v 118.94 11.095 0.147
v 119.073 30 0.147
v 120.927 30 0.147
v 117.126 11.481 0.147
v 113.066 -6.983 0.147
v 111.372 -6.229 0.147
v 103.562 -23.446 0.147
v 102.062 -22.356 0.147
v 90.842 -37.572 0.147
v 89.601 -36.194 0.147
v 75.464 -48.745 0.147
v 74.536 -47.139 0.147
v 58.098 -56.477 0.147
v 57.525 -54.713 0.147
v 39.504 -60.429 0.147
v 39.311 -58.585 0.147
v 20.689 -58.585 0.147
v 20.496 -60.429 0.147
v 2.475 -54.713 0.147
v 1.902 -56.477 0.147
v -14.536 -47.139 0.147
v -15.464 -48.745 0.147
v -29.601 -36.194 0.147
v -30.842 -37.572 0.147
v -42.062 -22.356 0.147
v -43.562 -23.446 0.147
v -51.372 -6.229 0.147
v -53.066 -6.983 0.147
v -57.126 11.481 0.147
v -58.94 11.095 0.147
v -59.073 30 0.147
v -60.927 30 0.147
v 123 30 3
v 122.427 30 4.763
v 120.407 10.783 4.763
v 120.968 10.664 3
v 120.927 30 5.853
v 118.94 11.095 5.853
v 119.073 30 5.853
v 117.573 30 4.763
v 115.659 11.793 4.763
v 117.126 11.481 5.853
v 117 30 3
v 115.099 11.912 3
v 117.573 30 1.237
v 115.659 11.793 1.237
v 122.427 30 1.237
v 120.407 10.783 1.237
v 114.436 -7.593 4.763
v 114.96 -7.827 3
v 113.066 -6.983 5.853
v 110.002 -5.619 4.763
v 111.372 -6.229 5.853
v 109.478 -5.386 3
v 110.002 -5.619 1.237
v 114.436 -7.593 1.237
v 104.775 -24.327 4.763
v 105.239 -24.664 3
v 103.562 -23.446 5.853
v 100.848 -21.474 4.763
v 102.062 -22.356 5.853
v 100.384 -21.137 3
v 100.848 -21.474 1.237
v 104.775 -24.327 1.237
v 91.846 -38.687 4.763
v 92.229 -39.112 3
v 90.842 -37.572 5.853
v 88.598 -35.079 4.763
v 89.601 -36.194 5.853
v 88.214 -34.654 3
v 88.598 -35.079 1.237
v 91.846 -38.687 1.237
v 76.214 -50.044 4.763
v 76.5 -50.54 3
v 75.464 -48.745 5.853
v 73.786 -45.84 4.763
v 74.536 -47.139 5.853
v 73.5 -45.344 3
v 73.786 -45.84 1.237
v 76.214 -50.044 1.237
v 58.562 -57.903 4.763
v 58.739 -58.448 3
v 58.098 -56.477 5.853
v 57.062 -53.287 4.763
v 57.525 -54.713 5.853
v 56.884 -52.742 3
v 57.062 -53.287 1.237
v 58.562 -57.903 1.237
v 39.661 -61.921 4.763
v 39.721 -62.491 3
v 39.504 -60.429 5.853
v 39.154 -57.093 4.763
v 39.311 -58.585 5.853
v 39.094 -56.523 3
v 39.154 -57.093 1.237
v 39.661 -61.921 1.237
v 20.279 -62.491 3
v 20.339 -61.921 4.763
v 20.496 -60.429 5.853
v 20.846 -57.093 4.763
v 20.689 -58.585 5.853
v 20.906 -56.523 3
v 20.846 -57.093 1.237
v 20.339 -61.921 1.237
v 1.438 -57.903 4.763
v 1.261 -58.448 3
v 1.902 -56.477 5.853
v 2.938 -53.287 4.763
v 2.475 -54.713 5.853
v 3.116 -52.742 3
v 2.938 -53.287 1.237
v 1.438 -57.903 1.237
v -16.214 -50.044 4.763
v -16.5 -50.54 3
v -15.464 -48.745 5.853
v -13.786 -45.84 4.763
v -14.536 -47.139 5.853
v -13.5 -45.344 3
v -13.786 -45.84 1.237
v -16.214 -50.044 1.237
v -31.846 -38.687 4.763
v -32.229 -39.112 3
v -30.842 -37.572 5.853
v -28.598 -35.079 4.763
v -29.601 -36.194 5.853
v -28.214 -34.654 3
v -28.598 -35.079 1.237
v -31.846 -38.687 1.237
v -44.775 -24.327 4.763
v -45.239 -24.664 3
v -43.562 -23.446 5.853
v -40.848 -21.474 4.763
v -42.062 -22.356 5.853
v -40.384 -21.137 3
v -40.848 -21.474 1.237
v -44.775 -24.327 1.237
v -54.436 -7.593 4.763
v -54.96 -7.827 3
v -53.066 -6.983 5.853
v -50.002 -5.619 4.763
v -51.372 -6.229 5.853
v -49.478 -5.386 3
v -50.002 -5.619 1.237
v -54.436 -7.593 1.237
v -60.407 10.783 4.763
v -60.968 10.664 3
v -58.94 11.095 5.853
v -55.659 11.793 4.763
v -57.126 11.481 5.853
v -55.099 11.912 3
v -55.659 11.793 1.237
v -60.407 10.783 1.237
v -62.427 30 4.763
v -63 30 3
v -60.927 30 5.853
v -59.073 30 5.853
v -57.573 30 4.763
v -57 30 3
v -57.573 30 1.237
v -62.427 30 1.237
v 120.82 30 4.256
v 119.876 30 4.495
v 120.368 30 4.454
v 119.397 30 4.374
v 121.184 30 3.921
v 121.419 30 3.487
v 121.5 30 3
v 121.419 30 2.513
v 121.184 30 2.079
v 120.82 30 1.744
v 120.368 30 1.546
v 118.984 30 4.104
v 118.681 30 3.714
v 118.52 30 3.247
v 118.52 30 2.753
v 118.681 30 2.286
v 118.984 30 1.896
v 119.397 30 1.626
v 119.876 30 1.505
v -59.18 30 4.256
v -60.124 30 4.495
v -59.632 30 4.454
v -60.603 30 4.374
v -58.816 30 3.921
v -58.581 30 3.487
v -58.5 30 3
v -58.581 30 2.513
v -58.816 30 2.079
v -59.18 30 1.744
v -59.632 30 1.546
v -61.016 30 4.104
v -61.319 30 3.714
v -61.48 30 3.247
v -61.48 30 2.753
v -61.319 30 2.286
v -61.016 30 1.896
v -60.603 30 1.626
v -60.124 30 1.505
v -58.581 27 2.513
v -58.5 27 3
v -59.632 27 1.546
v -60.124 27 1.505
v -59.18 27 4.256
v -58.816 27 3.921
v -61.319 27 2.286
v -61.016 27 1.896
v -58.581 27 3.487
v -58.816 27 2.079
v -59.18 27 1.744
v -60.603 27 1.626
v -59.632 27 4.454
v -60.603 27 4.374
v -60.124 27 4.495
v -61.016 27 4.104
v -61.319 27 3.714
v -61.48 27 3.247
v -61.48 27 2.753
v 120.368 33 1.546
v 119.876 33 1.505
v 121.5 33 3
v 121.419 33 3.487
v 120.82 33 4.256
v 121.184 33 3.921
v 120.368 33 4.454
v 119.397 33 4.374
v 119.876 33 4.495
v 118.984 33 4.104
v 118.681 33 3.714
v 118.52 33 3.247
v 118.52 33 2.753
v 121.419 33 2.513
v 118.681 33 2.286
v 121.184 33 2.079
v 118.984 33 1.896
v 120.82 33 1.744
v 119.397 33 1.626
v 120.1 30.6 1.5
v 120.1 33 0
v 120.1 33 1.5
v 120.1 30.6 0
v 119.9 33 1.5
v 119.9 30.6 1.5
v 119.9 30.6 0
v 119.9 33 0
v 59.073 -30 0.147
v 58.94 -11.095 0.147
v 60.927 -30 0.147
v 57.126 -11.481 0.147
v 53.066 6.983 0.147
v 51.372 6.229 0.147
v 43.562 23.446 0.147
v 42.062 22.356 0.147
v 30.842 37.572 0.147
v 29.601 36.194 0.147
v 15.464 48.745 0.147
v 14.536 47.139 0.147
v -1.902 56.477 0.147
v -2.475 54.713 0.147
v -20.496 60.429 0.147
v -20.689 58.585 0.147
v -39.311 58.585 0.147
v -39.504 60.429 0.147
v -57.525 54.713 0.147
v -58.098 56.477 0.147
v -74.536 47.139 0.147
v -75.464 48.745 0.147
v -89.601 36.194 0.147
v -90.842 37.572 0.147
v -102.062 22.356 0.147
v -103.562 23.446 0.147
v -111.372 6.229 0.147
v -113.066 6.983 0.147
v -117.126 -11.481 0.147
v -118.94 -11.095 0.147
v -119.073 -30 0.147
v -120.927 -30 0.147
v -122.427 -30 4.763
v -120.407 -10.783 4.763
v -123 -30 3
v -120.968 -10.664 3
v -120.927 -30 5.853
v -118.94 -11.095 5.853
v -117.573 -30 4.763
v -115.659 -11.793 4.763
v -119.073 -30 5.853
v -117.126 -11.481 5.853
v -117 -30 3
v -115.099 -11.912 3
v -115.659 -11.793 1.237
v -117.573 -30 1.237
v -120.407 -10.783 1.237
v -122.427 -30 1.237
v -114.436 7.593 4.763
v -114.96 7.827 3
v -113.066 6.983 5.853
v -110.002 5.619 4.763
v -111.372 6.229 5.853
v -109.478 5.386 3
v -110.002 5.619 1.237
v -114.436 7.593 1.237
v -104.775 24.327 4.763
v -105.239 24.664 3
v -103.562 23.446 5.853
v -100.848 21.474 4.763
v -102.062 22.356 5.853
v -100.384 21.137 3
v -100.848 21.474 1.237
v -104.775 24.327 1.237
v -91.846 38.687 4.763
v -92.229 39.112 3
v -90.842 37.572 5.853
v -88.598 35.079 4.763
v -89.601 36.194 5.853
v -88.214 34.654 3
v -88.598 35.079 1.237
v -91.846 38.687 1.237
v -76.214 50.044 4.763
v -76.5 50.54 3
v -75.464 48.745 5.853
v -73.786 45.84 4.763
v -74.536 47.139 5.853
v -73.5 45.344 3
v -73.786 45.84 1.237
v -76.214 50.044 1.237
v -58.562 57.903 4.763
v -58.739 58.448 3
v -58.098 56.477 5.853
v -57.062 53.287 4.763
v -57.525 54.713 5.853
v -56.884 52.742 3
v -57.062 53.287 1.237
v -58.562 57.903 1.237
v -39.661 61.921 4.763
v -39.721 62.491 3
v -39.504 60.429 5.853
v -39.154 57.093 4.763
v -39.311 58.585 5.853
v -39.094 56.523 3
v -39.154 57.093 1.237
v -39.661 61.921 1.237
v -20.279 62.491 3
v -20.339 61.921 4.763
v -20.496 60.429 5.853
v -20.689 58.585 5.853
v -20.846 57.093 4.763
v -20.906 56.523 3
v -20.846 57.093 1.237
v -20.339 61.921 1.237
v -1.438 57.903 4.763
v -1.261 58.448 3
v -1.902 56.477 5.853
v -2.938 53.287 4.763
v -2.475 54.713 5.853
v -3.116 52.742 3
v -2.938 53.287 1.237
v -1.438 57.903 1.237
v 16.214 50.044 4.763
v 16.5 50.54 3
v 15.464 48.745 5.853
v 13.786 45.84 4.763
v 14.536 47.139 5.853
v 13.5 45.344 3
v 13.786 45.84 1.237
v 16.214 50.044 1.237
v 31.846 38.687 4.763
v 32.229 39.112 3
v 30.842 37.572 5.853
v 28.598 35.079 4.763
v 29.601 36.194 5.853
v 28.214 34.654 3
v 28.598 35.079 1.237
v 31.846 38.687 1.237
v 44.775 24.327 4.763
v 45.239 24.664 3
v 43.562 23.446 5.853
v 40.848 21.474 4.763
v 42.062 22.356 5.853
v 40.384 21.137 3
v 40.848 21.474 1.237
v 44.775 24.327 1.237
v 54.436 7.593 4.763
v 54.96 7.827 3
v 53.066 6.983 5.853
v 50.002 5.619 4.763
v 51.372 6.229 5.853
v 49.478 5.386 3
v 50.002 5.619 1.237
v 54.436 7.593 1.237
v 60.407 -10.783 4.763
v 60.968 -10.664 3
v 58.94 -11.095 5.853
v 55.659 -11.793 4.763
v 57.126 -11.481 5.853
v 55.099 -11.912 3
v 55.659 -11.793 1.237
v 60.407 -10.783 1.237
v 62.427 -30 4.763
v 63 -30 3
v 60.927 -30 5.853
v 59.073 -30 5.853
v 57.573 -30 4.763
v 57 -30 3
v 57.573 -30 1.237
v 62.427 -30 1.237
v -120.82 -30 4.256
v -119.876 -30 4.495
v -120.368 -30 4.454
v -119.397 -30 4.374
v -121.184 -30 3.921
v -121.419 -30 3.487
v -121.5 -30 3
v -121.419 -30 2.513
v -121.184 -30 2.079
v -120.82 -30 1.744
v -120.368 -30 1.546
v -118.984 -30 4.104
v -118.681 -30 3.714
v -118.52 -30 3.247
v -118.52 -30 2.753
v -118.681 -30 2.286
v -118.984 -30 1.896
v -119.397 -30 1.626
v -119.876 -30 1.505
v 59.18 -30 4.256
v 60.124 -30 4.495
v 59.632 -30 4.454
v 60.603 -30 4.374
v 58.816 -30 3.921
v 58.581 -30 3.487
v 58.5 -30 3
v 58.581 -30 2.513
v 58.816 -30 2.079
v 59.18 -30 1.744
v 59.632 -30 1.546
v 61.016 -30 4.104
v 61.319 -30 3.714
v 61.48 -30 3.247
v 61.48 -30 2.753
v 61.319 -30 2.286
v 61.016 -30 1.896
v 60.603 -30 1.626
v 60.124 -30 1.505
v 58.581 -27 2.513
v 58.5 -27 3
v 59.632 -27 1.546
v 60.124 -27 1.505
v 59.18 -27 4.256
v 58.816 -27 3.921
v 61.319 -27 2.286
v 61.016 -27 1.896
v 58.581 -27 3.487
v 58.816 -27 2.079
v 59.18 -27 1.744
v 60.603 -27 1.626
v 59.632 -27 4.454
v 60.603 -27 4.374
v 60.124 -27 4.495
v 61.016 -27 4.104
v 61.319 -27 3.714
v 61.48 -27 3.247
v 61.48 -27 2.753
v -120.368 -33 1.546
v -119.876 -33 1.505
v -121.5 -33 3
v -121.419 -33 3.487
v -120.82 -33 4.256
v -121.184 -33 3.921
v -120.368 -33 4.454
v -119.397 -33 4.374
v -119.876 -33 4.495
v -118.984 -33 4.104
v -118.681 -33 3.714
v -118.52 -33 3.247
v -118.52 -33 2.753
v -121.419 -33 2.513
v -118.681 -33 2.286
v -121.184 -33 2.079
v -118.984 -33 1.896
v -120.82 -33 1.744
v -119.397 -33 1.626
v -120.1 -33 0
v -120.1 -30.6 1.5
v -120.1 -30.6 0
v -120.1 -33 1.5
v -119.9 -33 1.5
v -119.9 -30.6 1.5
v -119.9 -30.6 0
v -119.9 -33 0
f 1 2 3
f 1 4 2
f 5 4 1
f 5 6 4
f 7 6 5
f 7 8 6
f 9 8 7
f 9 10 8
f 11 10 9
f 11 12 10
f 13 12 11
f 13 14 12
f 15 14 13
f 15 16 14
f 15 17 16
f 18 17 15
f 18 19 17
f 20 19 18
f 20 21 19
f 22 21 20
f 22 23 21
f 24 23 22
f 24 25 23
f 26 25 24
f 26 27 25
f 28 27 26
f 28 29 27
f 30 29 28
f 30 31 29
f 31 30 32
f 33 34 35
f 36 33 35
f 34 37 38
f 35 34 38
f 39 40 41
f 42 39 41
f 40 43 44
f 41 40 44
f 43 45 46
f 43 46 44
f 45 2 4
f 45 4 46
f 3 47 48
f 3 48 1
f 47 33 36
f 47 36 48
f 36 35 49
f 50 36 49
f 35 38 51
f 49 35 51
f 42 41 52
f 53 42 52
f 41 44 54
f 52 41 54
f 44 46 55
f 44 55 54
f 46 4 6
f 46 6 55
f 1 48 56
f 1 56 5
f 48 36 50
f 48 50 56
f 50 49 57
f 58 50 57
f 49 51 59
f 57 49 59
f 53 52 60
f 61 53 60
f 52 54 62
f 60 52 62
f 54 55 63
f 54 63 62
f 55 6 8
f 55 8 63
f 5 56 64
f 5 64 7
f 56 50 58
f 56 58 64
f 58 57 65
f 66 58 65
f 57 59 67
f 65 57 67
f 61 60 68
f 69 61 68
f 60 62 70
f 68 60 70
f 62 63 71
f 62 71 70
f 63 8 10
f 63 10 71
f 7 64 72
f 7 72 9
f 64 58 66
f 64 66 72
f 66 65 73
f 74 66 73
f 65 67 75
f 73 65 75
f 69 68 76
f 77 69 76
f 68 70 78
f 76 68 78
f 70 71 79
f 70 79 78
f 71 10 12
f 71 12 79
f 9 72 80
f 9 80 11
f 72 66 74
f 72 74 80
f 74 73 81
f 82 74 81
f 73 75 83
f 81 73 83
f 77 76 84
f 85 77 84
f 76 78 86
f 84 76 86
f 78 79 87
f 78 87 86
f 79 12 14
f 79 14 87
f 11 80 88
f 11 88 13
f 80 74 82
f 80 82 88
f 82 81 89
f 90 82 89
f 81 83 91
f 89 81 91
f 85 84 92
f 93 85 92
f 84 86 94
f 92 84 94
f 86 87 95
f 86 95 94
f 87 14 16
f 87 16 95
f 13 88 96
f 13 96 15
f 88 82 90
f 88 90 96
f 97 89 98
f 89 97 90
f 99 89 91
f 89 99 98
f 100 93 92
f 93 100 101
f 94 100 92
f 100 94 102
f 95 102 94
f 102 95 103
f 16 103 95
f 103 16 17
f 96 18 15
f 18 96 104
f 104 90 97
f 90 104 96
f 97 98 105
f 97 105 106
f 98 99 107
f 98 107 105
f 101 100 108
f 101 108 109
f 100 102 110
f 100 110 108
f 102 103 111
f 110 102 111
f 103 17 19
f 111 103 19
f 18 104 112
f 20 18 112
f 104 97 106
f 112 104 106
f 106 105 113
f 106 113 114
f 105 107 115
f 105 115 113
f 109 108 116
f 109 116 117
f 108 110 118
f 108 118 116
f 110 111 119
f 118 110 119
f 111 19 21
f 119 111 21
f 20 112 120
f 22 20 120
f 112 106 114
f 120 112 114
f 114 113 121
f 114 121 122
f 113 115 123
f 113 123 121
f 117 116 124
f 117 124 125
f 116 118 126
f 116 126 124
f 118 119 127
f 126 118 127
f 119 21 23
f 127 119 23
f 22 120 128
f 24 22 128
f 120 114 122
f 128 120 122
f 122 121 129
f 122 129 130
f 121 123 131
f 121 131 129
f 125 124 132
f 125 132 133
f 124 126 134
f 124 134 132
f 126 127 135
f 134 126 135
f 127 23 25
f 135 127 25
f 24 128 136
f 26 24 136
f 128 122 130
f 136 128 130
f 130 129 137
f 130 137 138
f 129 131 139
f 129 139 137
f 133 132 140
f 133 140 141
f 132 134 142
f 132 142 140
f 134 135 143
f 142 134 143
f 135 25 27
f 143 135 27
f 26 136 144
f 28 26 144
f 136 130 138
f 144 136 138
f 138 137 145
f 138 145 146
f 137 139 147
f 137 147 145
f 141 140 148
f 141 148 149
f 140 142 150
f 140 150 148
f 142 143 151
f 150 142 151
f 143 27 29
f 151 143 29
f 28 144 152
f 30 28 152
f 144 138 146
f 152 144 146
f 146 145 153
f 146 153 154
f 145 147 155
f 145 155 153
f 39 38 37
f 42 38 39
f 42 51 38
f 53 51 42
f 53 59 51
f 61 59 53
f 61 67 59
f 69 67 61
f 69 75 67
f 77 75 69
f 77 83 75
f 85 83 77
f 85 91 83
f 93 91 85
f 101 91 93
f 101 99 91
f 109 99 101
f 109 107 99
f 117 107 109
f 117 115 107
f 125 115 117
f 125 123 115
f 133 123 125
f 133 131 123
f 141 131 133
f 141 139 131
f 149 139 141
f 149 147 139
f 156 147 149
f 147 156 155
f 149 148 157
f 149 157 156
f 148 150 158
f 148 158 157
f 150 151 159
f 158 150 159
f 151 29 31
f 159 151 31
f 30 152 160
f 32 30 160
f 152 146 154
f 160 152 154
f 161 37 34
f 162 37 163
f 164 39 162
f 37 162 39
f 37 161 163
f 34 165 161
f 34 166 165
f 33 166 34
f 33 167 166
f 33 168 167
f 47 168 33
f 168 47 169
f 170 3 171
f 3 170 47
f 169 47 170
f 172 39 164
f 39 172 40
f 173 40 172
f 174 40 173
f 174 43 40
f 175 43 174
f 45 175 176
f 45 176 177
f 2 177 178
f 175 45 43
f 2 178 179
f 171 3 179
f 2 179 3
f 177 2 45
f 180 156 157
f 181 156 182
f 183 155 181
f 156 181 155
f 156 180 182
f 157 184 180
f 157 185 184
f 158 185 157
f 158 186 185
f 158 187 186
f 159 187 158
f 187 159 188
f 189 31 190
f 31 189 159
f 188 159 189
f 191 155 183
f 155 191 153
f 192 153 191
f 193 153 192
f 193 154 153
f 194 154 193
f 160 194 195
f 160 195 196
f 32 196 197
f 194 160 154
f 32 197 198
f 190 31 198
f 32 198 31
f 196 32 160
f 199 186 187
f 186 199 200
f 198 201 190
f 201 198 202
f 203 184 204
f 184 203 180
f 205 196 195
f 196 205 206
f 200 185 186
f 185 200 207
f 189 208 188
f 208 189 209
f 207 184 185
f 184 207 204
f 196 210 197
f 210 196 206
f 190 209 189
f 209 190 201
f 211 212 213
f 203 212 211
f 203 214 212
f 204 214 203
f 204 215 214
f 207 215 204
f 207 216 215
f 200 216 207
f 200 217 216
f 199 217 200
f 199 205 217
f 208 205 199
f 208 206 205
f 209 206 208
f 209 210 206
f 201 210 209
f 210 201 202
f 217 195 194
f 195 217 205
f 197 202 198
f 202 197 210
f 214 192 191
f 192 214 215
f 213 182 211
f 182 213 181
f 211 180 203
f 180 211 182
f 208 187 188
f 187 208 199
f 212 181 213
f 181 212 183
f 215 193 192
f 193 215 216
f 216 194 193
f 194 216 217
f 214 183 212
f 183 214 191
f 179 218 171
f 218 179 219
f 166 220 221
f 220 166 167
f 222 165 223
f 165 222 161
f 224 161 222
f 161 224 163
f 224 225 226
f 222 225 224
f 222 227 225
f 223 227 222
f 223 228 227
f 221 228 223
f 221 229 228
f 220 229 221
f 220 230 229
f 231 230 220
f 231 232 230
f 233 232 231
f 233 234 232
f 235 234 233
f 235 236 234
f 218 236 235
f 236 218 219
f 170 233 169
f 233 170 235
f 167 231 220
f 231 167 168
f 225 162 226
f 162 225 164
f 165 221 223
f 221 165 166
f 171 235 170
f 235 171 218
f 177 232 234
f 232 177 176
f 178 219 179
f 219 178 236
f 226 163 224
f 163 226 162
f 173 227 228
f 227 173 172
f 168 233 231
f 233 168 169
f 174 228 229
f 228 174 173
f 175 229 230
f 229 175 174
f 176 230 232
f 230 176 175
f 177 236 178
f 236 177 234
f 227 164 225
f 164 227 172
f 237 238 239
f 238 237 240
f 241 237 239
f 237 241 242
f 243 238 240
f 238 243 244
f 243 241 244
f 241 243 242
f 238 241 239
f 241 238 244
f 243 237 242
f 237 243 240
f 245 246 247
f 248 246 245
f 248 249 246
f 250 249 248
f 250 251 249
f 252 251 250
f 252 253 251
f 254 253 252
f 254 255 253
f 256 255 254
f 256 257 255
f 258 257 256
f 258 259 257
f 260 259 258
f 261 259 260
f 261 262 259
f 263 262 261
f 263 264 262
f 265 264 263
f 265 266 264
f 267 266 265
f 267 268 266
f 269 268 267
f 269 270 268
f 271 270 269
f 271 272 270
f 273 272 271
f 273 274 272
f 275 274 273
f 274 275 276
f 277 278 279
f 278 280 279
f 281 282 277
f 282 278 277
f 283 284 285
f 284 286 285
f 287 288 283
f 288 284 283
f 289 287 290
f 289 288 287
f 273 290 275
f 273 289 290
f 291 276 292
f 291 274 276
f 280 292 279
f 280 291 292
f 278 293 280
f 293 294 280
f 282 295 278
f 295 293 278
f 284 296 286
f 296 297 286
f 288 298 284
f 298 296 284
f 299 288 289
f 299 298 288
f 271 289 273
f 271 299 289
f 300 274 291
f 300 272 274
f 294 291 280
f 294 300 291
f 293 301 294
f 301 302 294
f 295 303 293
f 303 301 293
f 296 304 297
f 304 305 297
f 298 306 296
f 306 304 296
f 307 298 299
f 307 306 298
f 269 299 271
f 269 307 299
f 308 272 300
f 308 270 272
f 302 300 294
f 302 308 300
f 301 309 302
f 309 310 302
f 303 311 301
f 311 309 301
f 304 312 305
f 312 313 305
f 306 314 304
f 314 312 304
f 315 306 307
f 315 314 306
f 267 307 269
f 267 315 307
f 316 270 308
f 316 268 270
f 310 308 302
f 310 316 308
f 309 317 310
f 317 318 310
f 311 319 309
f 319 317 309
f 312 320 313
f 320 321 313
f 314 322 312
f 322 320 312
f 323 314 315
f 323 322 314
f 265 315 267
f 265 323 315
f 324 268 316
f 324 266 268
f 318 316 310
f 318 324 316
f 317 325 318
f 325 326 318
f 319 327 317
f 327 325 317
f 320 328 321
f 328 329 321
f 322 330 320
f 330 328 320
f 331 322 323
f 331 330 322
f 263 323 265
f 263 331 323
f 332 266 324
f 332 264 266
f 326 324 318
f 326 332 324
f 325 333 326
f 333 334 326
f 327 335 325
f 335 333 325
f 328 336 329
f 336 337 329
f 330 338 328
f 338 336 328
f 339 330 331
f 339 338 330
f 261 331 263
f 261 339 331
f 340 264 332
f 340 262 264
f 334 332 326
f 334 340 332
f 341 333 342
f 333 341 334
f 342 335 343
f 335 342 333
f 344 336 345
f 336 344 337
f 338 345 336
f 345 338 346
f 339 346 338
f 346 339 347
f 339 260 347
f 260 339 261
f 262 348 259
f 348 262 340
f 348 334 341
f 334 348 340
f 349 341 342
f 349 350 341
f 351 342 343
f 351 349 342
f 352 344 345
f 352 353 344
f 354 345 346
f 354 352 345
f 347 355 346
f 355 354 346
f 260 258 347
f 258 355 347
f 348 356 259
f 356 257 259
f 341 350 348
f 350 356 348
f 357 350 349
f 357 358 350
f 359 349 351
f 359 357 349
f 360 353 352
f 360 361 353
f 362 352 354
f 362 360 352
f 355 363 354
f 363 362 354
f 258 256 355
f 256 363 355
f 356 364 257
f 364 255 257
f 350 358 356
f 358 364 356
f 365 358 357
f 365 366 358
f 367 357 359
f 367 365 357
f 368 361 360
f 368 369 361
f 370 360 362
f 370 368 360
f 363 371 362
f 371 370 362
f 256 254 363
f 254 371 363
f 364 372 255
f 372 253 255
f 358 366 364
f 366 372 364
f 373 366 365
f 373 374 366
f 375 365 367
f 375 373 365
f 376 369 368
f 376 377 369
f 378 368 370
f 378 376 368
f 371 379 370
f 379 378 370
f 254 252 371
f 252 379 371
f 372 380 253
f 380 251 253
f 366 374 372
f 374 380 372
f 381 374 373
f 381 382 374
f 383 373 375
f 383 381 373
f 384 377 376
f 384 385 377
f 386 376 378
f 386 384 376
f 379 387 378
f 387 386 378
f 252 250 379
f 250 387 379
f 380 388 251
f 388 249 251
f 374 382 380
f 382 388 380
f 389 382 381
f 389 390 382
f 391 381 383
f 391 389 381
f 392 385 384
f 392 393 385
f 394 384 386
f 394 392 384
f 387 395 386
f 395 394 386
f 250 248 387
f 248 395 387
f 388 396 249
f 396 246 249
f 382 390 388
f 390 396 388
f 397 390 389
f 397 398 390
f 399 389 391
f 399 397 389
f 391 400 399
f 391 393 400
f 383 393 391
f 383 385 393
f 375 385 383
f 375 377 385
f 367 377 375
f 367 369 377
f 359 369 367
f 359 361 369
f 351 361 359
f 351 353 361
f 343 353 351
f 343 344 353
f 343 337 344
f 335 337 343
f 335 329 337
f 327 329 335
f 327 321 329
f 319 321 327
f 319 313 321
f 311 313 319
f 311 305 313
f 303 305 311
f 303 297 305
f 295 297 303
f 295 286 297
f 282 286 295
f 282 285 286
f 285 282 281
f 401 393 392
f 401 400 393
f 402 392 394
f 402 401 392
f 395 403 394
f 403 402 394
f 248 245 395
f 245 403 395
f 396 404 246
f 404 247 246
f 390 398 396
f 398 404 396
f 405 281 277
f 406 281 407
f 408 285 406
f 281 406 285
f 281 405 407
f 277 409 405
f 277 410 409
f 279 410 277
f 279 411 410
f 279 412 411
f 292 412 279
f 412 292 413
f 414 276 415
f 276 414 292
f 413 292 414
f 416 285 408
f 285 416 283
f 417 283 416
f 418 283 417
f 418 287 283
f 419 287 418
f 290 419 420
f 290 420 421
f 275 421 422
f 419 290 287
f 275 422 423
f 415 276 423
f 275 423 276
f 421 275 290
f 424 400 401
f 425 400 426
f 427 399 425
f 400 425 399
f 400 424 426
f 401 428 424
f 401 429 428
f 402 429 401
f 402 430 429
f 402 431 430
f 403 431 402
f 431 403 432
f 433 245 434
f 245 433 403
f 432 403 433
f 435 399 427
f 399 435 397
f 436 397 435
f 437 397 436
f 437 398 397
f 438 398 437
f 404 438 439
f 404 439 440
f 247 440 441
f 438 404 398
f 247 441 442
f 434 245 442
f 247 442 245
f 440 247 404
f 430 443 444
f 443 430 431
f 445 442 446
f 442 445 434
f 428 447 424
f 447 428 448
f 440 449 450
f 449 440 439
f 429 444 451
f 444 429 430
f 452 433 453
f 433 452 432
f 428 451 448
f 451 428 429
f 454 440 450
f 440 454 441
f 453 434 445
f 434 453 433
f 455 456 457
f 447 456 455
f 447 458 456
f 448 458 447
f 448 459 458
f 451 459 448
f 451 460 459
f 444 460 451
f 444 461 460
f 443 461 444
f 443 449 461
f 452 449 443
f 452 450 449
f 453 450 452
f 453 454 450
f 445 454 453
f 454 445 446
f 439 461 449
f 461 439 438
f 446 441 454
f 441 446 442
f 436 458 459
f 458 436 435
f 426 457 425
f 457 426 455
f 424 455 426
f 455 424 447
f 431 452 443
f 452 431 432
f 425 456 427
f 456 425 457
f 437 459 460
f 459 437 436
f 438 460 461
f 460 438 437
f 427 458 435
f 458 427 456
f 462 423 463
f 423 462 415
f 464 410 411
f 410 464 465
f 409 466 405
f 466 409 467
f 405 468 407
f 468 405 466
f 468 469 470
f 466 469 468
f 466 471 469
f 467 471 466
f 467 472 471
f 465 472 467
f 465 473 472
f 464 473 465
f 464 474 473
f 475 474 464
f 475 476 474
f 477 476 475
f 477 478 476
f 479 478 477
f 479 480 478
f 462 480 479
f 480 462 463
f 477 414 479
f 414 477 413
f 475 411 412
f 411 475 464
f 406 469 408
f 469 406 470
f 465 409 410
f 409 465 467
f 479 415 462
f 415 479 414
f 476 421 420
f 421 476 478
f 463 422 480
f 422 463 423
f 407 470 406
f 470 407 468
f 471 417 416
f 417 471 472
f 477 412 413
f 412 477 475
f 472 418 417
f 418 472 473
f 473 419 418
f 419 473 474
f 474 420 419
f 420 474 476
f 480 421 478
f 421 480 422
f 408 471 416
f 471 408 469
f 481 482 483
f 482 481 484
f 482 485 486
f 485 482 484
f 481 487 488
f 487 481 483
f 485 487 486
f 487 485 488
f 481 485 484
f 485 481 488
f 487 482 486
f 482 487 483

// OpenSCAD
//Anthony Weber
//agweber@indiana.edu
//March 15, 2013

//build platform replicator2
//--284mm long
//--154mm wide
//--152mm tall

//From origin to center of ring
radius = 90; //

//Thickness is the diameter of the circle
thickness = 6; //

//Build support for nib? 1 == true
addSupport = 1; //[0:1]


//Fine tuning Y, bring circles closer
closeY = 0; //[0:20]

//Fine tuning X, bring circles closer
closeX = 0; //[0:20]

//Fine tuning, nib support thickness
supportThickness = 0.2;

//Show platform, 1 == true
showPlatform = 0; //[0:1]

//Platform X
platformX = 284;
//Platform Y
platformY = 154;

translate([radius/3 - closeX,radius/3 + closeY,0])
	wheelquarter(radius,thickness,addSupport);
rotate([0,0,180]) translate([radius/3 - closeX,radius/3 + closeY,0])
	wheelquarter(radius,thickness,addSupport);


module wheelquarter(wheelRadius=120, wheelThickness=6, support=1) {
	added=wheelRadius+wheelThickness/2;
	barSpacing = 10; //centimeter between the wheel bars
	difference() {
		union() {
			translate([0,0,wheelThickness/2])
				rotate_extrude() { //donut shape
				  translate([wheelRadius,0,0]) circle(r=wheelThickness/2);
				}
		}
		//Two cubes for halving the donut (could be one, I know)
		color("red") cube([added,added,wheelThickness]);
		translate([-added,0,0])color("red") cube([added,added,wheelThickness]);

		translate([-wheelRadius,0.5,wheelThickness/2]) //anti-nib
			rotate([90,0,0]) scale([0.25,0.25,1])
				cylinder(r=wheelThickness,h=wheelThickness/2+0.5);
	}
	translate([wheelRadius,wheelThickness/2,wheelThickness/2]) //nib
		rotate([90,0,0]) scale([0.25,0.25,1])
			cylinder(r=wheelThickness,h=wheelThickness/2);
	//Nib support.. thin cube underneath it could easily be cut off
	if (support != 0) {
		translate([wheelRadius-supportThickness/2,wheelThickness/2*0.2,0])
			color("white") cube([supportThickness,wheelThickness/2*0.8,wheelThickness/4]);
	}
}

//build platform
if (showPlatform != 0) {
	translate([-platformX/2,-platformY/2,-1])
		color("gray") cube([platformX,platformY,0.9]);
}
